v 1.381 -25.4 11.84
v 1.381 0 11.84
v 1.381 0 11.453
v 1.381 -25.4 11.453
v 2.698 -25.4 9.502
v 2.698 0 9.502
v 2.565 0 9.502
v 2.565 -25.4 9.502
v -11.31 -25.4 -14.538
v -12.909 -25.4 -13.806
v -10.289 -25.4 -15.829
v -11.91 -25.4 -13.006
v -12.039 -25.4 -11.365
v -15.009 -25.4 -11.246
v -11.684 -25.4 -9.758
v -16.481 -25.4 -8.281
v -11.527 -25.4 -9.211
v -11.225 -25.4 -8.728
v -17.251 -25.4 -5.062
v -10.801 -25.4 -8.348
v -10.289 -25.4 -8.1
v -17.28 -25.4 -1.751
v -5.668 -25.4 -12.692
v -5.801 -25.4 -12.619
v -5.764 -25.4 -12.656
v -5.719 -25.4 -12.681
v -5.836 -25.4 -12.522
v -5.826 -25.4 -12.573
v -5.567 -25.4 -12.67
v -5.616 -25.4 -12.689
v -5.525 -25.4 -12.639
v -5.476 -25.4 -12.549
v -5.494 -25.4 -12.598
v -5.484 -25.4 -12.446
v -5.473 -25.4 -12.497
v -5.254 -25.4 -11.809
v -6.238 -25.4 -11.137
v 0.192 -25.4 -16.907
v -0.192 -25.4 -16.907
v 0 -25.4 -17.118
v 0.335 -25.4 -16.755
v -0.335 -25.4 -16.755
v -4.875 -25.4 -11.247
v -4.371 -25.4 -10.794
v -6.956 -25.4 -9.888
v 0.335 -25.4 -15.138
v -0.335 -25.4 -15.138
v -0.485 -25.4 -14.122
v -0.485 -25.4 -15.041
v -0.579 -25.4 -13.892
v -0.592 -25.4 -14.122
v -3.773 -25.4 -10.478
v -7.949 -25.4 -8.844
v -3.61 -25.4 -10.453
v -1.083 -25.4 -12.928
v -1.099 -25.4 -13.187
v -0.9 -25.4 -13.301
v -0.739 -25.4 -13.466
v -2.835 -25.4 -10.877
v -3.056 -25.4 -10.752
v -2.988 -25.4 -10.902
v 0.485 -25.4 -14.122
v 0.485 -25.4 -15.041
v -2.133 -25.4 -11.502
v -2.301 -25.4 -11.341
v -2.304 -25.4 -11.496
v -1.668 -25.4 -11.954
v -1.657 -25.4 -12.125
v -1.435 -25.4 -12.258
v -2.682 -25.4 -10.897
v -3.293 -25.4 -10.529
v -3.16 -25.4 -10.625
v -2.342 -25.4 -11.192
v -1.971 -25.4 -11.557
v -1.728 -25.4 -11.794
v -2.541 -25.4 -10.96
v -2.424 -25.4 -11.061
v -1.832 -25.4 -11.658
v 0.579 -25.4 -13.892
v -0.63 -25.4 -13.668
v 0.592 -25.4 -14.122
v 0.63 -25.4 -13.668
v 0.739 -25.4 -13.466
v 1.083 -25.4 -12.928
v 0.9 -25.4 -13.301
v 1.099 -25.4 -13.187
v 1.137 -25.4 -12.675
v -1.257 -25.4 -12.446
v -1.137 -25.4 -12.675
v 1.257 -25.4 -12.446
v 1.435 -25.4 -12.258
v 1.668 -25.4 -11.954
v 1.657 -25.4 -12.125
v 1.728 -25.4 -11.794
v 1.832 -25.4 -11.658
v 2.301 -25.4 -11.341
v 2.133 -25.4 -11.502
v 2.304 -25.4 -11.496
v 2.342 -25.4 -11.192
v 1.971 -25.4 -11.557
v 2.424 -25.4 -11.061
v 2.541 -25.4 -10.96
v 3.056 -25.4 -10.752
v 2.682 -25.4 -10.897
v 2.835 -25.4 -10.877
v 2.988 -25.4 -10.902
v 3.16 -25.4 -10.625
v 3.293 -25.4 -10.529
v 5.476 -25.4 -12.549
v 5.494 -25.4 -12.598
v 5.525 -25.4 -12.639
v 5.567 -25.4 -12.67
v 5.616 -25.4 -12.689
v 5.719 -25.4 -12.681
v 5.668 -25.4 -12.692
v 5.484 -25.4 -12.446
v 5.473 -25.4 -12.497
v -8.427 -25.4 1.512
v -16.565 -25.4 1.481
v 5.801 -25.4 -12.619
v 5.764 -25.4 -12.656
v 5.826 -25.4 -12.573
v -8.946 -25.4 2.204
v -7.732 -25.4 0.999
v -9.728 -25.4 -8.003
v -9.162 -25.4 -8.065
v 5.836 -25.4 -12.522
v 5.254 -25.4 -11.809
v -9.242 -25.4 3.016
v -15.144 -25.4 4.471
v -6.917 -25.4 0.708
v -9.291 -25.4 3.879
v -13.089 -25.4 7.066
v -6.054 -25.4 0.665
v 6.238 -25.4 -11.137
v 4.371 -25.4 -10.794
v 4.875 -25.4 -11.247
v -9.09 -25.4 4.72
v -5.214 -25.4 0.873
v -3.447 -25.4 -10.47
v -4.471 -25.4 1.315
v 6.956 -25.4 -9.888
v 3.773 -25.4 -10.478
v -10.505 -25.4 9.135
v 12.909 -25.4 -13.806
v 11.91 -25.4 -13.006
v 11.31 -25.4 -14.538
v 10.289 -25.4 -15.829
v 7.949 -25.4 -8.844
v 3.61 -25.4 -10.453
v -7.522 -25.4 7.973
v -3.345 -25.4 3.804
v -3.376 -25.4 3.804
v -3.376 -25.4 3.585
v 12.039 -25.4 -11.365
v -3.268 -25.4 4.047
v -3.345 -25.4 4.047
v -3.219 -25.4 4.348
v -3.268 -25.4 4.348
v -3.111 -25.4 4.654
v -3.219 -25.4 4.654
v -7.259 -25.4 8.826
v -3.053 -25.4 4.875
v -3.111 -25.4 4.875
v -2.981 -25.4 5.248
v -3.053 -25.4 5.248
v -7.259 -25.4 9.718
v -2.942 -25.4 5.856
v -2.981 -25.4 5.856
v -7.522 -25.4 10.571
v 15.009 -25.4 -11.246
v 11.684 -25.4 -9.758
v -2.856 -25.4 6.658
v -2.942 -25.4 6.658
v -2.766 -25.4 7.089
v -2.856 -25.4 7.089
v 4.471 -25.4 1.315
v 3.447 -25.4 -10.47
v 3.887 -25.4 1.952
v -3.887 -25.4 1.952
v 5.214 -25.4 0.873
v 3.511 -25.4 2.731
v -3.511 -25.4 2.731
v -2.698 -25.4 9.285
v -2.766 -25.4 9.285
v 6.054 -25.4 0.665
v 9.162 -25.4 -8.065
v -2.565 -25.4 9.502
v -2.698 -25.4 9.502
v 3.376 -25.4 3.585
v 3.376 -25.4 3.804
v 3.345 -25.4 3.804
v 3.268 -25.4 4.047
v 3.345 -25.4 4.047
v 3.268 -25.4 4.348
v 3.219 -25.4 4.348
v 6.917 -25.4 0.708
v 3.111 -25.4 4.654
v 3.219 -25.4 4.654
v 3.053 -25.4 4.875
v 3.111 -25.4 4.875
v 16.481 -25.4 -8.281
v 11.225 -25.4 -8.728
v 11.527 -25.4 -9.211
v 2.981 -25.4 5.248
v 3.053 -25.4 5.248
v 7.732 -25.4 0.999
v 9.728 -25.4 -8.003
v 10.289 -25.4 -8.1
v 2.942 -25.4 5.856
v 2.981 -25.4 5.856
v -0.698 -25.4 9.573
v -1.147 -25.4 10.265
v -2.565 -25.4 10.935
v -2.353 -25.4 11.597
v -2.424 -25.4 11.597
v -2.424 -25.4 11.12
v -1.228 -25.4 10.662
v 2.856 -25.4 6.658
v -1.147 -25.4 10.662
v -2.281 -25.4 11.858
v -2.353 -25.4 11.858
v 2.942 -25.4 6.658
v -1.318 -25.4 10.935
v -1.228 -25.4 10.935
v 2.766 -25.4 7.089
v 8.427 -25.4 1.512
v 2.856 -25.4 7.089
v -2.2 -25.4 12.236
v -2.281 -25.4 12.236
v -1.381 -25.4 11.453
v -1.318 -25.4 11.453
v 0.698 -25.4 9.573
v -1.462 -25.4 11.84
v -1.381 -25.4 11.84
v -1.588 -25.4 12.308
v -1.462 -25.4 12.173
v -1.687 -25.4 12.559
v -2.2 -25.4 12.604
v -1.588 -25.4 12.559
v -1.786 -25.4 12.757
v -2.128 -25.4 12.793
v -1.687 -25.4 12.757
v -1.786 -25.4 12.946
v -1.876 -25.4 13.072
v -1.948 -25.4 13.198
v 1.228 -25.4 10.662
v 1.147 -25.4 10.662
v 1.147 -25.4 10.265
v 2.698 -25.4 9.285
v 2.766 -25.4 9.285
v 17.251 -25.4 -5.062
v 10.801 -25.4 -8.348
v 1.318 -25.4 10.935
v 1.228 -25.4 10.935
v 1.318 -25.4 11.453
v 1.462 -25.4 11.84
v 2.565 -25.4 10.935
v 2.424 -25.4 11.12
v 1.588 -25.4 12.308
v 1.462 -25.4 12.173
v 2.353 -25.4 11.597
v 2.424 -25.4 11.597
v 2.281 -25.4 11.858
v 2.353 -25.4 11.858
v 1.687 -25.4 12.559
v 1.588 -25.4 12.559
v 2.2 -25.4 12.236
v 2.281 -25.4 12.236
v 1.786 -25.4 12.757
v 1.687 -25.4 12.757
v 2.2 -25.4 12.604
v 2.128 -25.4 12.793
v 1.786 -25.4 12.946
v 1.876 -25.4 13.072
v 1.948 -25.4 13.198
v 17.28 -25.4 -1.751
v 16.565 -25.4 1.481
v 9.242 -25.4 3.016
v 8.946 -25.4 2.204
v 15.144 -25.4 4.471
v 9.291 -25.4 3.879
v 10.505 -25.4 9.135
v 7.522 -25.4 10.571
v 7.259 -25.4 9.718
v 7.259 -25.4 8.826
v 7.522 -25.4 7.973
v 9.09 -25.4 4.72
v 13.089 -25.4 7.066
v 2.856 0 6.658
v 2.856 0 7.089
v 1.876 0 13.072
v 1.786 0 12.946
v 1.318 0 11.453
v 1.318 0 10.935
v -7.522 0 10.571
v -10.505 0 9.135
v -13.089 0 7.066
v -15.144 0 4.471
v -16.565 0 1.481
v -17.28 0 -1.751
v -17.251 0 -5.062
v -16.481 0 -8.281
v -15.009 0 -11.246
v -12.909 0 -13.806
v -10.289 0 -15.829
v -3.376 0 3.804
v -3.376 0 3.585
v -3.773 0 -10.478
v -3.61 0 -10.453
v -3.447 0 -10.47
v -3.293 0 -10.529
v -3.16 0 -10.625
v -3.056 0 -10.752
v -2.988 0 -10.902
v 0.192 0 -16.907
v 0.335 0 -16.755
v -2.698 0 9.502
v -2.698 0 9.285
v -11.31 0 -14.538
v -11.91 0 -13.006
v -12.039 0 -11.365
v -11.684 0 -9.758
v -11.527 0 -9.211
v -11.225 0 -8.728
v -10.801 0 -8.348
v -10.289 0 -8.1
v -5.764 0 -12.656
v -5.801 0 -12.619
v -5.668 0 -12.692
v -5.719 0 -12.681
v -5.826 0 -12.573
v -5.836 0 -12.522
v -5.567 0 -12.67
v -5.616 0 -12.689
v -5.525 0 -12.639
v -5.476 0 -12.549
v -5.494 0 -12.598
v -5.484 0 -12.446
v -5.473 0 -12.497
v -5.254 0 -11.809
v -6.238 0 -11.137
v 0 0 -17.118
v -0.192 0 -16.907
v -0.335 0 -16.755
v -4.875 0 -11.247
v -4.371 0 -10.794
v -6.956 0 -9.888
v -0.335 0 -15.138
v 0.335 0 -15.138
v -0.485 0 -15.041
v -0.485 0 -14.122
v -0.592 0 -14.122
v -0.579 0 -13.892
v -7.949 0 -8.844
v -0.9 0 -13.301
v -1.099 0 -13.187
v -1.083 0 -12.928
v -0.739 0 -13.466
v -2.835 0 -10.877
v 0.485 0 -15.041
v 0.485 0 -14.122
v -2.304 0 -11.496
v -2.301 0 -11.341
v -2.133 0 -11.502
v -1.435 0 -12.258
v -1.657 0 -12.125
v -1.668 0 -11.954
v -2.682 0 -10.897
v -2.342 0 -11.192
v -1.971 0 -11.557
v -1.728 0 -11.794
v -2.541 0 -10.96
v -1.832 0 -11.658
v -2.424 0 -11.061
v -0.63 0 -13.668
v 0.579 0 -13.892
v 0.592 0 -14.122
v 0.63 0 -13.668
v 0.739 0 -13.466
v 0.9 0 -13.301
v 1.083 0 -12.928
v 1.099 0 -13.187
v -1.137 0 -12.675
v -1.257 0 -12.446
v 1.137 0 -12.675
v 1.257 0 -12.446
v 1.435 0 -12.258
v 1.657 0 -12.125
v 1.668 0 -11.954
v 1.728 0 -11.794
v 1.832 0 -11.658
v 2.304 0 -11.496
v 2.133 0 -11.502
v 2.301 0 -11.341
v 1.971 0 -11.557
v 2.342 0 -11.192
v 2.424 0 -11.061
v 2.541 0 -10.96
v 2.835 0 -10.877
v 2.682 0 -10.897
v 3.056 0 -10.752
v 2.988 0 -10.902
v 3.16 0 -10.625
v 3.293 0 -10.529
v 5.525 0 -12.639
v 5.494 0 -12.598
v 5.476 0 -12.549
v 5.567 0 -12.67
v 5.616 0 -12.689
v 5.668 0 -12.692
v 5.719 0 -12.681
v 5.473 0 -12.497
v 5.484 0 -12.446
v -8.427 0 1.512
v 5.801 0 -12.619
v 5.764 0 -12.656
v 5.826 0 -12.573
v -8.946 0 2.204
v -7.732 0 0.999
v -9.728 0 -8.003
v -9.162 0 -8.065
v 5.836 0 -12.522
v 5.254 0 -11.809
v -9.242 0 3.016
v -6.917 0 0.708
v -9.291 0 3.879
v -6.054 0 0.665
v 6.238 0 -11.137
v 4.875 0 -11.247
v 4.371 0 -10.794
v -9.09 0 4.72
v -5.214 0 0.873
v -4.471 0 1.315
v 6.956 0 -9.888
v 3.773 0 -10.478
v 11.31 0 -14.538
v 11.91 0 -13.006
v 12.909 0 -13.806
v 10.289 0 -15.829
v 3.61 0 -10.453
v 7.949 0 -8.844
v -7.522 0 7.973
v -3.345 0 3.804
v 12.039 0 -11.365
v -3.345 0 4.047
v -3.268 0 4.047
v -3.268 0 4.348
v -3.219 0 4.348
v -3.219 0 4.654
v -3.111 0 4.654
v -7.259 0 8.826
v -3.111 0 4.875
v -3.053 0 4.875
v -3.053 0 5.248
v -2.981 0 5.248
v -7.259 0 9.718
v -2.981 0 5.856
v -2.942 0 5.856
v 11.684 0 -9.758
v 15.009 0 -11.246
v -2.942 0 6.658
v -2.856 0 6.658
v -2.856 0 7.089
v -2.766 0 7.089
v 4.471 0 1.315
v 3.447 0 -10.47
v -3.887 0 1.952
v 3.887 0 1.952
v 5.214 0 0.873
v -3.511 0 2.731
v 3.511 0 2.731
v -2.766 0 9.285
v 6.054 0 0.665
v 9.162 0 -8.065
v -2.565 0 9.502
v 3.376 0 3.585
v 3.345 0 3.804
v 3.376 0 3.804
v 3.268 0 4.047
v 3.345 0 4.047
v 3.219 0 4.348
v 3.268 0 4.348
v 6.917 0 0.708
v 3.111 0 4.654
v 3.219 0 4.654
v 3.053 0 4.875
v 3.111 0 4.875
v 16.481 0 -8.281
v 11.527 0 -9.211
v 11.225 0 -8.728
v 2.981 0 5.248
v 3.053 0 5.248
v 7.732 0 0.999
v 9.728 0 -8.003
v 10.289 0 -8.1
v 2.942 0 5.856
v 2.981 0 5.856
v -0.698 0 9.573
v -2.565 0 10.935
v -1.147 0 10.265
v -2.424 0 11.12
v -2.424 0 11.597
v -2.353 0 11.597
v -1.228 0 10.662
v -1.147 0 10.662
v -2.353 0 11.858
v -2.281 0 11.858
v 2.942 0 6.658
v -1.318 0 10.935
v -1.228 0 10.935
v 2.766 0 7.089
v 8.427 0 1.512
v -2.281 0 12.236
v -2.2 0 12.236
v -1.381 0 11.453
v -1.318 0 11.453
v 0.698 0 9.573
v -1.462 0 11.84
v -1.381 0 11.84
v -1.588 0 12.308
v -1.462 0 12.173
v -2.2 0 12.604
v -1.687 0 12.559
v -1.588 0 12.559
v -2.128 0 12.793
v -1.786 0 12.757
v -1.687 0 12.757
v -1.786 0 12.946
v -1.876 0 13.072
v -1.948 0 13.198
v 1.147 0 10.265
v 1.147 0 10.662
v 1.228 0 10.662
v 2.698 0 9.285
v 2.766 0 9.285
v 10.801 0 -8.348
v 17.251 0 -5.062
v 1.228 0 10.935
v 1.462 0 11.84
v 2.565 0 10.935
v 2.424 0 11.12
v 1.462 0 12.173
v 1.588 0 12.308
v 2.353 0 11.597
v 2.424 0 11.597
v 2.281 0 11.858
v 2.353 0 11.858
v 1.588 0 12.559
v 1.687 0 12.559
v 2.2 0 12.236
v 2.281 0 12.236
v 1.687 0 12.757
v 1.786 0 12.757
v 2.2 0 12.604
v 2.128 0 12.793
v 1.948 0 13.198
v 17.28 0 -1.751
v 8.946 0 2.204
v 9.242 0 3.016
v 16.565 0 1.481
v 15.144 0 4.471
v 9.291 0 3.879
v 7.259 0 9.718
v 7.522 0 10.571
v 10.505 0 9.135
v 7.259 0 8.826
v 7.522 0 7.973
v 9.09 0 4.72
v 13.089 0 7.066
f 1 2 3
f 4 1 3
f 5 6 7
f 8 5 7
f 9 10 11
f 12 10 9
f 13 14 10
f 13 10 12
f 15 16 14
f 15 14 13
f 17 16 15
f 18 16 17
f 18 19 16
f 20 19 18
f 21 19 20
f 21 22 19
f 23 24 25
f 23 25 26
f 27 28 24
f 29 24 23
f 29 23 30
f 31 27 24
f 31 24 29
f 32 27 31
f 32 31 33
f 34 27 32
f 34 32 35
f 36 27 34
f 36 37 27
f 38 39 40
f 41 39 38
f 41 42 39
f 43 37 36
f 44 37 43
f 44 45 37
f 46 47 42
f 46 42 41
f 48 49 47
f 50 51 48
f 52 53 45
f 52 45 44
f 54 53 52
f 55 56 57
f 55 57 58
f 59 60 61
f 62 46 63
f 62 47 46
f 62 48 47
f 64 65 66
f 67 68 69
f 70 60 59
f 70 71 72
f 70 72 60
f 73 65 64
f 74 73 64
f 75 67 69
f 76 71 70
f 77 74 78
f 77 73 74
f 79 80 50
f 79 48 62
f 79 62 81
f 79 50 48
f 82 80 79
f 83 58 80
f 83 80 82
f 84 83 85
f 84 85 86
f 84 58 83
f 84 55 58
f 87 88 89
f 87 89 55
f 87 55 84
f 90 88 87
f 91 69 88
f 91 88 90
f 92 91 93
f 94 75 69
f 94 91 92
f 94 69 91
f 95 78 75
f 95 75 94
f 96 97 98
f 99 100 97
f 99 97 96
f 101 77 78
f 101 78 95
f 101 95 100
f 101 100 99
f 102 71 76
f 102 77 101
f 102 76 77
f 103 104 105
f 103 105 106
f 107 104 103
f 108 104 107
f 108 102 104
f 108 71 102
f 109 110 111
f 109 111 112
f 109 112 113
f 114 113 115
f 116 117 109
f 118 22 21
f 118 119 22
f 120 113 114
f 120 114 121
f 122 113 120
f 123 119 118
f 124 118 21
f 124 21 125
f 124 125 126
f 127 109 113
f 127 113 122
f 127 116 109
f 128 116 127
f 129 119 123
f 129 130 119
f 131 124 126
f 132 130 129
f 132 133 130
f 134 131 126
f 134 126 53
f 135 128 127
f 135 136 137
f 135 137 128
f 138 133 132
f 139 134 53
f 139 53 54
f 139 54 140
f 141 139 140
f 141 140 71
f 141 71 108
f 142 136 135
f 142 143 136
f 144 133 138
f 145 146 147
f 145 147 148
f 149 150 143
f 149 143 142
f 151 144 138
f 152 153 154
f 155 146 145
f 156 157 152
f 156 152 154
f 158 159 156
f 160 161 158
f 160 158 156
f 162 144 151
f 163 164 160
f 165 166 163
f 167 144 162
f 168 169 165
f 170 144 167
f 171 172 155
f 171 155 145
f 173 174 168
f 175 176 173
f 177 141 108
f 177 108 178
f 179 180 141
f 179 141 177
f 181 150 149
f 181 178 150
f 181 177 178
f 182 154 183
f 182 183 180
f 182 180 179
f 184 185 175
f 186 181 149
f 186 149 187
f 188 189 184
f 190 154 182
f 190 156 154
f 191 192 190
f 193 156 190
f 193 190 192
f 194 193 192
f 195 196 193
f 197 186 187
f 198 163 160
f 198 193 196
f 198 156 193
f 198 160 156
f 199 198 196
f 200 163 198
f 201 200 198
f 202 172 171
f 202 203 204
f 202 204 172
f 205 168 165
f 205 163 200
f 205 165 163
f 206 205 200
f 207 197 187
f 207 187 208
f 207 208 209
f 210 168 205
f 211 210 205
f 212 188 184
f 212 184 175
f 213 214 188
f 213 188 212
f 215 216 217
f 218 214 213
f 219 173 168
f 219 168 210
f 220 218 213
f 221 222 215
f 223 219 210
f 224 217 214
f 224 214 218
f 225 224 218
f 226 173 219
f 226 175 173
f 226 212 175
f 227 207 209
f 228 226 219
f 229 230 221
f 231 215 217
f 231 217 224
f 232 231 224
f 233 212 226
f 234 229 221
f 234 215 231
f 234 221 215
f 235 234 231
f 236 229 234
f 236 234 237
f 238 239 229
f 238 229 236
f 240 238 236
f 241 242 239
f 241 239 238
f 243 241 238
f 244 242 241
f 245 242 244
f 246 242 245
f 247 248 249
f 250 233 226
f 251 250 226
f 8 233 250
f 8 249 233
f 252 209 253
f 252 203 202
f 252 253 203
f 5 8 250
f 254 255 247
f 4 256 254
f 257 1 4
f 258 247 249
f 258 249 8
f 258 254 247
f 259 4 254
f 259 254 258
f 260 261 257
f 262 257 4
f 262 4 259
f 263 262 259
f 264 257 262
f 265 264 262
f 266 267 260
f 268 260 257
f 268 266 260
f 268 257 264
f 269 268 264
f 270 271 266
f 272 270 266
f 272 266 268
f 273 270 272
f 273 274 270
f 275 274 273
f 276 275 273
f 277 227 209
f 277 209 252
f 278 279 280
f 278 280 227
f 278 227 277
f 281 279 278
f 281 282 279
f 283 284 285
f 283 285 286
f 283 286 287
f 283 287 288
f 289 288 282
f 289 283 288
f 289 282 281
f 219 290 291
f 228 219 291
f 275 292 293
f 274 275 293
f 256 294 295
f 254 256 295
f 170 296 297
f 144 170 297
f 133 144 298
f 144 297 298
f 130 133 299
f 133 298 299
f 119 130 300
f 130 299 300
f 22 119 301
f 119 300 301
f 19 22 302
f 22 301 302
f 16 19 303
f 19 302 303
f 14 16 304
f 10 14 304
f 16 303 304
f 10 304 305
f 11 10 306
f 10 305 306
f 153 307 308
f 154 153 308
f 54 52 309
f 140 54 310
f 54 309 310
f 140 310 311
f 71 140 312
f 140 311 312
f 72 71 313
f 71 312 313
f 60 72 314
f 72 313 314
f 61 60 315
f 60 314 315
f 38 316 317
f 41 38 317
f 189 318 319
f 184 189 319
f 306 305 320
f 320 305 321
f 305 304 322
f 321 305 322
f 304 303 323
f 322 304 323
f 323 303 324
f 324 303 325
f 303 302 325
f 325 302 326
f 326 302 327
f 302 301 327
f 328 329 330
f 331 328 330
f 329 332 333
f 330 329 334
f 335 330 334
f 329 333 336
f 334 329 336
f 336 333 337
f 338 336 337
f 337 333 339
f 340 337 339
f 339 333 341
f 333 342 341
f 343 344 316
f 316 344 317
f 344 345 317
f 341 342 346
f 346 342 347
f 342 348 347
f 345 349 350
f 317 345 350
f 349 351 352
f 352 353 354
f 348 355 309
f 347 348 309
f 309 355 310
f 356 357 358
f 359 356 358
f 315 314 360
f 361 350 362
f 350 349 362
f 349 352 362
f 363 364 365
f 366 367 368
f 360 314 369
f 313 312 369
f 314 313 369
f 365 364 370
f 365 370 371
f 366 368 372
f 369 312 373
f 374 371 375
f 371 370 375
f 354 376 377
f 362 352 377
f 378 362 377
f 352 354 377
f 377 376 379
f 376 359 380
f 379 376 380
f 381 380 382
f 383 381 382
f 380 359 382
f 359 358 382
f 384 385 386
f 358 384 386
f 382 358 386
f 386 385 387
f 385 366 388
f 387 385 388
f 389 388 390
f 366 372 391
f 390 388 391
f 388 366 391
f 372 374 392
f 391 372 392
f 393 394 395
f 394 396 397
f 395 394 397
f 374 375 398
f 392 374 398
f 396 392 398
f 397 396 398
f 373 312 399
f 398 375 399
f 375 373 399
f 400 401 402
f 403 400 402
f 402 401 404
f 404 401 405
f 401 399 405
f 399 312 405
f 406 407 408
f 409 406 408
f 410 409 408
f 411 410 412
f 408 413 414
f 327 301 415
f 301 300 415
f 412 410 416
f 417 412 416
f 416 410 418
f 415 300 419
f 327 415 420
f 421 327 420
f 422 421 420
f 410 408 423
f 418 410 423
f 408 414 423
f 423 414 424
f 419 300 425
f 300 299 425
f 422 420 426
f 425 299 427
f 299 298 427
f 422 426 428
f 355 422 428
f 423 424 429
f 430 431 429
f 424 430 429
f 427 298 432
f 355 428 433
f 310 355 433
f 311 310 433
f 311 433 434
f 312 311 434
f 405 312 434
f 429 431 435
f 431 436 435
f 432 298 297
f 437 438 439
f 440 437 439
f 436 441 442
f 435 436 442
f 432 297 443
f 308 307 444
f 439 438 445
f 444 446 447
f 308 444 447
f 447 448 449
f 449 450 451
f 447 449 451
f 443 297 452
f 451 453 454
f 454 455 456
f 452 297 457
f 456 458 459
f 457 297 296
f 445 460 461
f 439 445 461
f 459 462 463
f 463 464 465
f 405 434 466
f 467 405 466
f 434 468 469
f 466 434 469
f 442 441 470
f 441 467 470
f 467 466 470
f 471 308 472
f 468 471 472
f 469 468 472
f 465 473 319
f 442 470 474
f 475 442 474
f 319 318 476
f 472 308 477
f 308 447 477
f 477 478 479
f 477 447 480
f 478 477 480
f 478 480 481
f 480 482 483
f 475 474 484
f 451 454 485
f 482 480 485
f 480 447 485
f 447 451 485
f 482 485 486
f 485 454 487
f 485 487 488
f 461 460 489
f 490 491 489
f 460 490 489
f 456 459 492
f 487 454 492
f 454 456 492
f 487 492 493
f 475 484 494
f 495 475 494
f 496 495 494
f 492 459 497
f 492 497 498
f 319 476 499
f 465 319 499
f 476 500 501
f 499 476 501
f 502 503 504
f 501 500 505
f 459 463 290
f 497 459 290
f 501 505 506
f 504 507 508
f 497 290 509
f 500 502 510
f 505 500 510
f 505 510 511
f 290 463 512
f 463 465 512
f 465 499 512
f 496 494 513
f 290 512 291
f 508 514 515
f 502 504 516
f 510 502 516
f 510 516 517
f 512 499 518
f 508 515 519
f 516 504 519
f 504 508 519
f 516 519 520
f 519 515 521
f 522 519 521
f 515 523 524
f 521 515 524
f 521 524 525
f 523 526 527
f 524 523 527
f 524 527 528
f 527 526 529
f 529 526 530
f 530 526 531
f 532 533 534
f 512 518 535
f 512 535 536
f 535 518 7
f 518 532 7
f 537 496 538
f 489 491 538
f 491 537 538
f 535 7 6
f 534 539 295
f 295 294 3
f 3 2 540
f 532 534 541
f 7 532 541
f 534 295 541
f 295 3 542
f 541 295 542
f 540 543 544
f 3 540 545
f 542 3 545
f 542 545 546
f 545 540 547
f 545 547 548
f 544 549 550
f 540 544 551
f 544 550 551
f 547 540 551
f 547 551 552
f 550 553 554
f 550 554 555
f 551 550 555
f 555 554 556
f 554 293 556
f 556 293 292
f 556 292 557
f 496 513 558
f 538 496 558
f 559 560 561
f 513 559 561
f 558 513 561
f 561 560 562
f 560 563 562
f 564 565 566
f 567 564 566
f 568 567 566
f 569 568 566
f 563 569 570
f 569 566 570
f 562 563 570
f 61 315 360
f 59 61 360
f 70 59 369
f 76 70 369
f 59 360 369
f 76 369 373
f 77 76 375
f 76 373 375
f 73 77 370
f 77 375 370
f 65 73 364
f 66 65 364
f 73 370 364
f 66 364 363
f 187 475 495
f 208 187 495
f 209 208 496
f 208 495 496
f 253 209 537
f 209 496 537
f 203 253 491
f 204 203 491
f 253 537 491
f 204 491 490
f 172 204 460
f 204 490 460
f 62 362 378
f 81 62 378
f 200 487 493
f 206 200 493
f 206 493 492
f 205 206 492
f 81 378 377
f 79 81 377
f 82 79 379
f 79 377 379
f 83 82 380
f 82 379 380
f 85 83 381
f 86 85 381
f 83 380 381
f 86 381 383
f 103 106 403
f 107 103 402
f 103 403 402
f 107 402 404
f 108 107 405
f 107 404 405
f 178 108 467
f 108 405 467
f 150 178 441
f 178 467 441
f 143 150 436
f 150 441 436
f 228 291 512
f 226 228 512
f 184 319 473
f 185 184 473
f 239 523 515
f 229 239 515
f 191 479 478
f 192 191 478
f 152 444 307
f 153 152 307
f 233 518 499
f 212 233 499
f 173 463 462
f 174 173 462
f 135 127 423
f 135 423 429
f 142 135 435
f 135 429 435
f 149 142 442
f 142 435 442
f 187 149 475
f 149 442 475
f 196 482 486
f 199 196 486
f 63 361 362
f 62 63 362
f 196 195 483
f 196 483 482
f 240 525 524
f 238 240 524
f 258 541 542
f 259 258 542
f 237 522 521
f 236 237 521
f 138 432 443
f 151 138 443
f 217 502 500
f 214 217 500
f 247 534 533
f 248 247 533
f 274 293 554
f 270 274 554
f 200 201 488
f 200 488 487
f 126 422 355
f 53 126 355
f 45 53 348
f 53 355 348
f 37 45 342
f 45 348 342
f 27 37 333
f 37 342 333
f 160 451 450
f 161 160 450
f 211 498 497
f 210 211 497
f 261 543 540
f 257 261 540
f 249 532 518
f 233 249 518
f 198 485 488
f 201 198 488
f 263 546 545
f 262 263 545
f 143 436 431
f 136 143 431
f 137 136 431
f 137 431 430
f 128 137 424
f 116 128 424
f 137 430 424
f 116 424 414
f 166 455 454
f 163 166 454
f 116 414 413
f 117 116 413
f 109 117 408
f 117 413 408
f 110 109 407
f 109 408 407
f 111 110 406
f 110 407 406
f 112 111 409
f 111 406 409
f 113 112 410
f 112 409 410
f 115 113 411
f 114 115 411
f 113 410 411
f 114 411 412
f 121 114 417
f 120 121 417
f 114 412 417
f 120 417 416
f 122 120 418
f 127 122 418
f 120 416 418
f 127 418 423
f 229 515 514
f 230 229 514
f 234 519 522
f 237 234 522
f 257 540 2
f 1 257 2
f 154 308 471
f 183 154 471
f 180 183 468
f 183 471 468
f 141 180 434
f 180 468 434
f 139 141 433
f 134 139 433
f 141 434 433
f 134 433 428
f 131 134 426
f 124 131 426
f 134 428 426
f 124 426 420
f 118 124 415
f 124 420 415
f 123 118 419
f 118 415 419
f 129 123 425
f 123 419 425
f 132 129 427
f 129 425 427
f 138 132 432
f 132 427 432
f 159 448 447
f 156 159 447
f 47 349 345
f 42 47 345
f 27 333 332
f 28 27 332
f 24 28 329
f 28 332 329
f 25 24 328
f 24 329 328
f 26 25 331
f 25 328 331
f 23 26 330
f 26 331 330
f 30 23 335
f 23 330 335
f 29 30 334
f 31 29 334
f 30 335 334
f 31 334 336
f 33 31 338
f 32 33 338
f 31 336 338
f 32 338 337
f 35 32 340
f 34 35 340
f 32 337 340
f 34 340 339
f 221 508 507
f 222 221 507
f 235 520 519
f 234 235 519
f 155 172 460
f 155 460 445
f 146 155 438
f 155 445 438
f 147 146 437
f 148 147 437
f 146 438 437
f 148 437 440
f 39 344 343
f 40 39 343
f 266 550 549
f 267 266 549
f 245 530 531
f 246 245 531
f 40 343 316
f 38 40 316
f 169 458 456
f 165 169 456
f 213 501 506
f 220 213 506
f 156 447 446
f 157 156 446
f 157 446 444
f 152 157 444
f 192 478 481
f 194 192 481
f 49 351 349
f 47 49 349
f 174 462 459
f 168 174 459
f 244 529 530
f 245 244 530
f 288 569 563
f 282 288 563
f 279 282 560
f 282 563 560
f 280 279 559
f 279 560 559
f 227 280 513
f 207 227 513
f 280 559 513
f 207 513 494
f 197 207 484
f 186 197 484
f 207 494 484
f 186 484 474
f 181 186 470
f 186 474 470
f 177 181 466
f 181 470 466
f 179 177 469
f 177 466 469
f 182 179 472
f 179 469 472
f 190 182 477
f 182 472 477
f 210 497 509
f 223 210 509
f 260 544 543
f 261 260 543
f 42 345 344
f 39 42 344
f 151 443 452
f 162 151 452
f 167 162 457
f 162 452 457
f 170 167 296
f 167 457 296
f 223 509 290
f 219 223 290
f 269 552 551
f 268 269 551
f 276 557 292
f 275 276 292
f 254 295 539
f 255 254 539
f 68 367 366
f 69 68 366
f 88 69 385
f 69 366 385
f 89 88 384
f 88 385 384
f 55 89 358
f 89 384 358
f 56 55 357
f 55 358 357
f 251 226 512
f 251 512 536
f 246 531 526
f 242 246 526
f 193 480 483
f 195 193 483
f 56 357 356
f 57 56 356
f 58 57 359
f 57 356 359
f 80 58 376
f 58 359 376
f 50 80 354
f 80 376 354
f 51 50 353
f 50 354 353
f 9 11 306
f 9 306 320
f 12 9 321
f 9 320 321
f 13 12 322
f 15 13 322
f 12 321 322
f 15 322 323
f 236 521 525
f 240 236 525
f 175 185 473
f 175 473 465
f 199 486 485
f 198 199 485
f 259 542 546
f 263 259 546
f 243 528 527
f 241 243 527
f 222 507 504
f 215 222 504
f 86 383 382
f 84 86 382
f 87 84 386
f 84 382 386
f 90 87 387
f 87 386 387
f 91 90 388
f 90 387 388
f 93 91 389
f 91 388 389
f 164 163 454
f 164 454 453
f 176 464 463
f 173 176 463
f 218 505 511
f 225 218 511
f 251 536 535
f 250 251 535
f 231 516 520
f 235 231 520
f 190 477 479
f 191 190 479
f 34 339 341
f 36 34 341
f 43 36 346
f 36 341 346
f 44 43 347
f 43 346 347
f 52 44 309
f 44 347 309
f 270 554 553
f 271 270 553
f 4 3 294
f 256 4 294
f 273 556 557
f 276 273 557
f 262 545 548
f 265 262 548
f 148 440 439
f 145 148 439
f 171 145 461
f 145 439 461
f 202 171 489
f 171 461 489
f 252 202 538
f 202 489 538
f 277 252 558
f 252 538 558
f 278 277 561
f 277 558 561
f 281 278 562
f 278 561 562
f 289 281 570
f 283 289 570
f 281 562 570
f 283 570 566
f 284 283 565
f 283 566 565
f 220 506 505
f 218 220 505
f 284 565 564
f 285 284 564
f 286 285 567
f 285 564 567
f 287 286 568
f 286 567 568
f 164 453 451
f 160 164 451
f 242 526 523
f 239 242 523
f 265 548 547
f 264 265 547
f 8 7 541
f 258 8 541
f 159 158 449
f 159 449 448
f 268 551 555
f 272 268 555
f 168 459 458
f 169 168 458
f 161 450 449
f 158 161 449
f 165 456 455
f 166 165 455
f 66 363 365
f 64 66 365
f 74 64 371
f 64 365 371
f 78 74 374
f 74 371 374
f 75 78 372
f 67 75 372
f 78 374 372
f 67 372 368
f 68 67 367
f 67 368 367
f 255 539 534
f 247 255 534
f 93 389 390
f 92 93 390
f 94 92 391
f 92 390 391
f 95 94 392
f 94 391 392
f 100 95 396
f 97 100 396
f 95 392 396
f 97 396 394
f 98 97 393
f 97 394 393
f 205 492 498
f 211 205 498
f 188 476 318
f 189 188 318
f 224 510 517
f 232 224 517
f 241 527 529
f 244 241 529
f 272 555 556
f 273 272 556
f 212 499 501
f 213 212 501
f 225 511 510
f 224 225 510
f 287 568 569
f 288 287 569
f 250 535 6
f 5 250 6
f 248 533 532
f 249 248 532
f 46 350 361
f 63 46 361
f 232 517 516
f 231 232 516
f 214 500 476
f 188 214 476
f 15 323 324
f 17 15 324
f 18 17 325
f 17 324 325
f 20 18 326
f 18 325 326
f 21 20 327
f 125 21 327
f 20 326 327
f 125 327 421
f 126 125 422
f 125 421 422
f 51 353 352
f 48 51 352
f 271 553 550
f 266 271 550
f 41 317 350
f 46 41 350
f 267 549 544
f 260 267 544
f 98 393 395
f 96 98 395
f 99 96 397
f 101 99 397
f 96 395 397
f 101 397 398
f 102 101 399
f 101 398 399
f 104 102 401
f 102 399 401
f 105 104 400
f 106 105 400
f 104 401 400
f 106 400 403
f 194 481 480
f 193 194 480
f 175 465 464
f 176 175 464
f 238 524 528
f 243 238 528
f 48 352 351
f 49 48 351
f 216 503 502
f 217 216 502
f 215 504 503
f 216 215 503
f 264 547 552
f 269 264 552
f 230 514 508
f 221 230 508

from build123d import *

# Parameters (mm, degrees)
F1_DEPTH = 25.4


with BuildPart() as f1:
    # F0 (on Front) → F1 (new body)
    with BuildSketch(Plane.XZ):
        with BuildLine():
            ThreePointArc((11.683757, -9.757952), (11.910295, -13.005869), (10.289053, -15.829317))
            ThreePointArc((10.289053, -15.829317), (17.279713, -1.751364), (7.521968, 10.571157))
            ThreePointArc((7.521968, 10.571157), (7.225303, 9.272076), (7.521968, 7.972996))
            Line((7.521968, 7.972996), (9.089584, 4.719736))
            ThreePointArc((9.089584, 4.719736), (6.917131, 0.708181), (3.376378, 3.584845))
            Line((3.376378, 3.584845), (3.376378, 3.804322))
            Line((3.376378, 3.804322), (3.344805, 3.804322))
            Line((3.344805, 3.804322), (3.344805, 4.047158))
            Line((3.344805, 4.047158), (3.268356, 4.047158))
            Line((3.268356, 4.047158), (3.268356, 4.348455))
            Line((3.268356, 4.348455), (3.218889, 4.348455))
            Line((3.218889, 4.348455), (3.218889, 4.654248))
            Line((3.218889, 4.654248), (3.110962, 4.654248))
            Line((3.110962, 4.654248), (3.110962, 4.8746))
            Line((3.110962, 4.8746), (3.052502, 4.8746))
            Line((3.052502, 4.8746), (3.052502, 5.247848))
            Line((3.052502, 5.247848), (2.98055, 5.247848))
            Line((2.98055, 5.247848), (2.98055, 5.855694))
            Line((2.98055, 5.855694), (2.941553, 5.855694))
            Line((2.941553, 5.855694), (2.941553, 6.657867))
            Line((2.941553, 6.657867), (2.855988, 6.657867))
            Line((2.855988, 6.657867), (2.855988, 7.089451))
            Line((2.855988, 7.089451), (2.765684, 7.089451))
            Line((2.765684, 7.089451), (2.765684, 7.641547))
            Line((2.765684, 7.641547), (2.765684, 9.285447))
            Line((2.765684, 9.285447), (2.69841, 9.285447))
            Line((2.69841, 9.285447), (2.69841, 9.501676))
            Line((2.69841, 9.501676), (2.564857, 9.501676))
            Line((2.564857, 9.501676), (2.564857, 10.264836))
            Line((2.564857, 10.264836), (2.564857, 10.934666))
            Line((2.564857, 10.934666), (2.42448, 11.120381))
            Line((2.42448, 11.120381), (2.42448, 11.597059))
            Line((2.42448, 11.597059), (2.352529, 11.597059))
            Line((2.352529, 11.597059), (2.352529, 11.857883))
            Line((2.352529, 11.857883), (2.280578, 11.857883))
            Line((2.280578, 11.857883), (2.280578, 12.235628))
            Line((2.280578, 12.235628), (2.199632, 12.235628))
            Line((2.199632, 12.235628), (2.199632, 12.451482))
            Line((2.199632, 12.451482), (2.199632, 12.604379))
            Line((2.199632, 12.604379), (2.12768, 12.793251))
            Line((2.12768, 12.793251), (1.947802, 13.197979))
            Line((1.947802, 13.197979), (1.875851, 13.072063))
            Line((1.875851, 13.072063), (1.785911, 12.946148))
            Line((1.785911, 12.946148), (1.785911, 12.757276))
            Line((1.785911, 12.757276), (1.686978, 12.757276))
            Line((1.686978, 12.757276), (1.686978, 12.559409))
            Line((1.686978, 12.559409), (1.588045, 12.559409))
            Line((1.588045, 12.559409), (1.588045, 12.30758))
            Line((1.588045, 12.30758), (1.46213, 12.17267))
            Line((1.46213, 12.17267), (1.46213, 11.839896))
            Line((1.46213, 11.839896), (1.381184, 11.839896))
            Line((1.381184, 11.839896), (1.381184, 11.453156))
            Line((1.381184, 11.453156), (1.318227, 11.453156))
            Line((1.318227, 11.453156), (1.318227, 10.934666))
            Line((1.318227, 10.934666), (1.228288, 10.934666))
            Line((1.228288, 10.934666), (1.228288, 10.66169))
            Line((1.228288, 10.66169), (1.147342, 10.66169))
            Line((1.147342, 10.66169), (1.147342, 10.264836))
            Line((1.147342, 10.264836), (0.697646, 9.573425))
            Line((0.697646, 9.573425), (0, 9.573425))
            Line((0, 9.573425), (-0.697646, 9.573425))
            Line((-0.697646, 9.573425), (-1.147342, 10.264836))
            Line((-1.147342, 10.264836), (-1.147342, 10.66169))
            Line((-1.147342, 10.66169), (-1.228288, 10.66169))
            Line((-1.228288, 10.66169), (-1.228288, 10.934666))
            Line((-1.228288, 10.934666), (-1.318227, 10.934666))
            Line((-1.318227, 10.934666), (-1.318227, 11.453156))
            Line((-1.318227, 11.453156), (-1.381184, 11.453156))
            Line((-1.381184, 11.453156), (-1.381184, 11.839896))
            Line((-1.381184, 11.839896), (-1.46213, 11.839896))
            Line((-1.46213, 11.839896), (-1.46213, 12.17267))
            Line((-1.46213, 12.17267), (-1.588045, 12.30758))
            Line((-1.588045, 12.30758), (-1.588045, 12.559409))
            Line((-1.588045, 12.559409), (-1.686978, 12.559409))
            Line((-1.686978, 12.559409), (-1.686978, 12.757276))
            Line((-1.686978, 12.757276), (-1.785911, 12.757276))
            Line((-1.785911, 12.757276), (-1.785911, 12.946148))
            Line((-1.785911, 12.946148), (-1.875851, 13.072063))
            Line((-1.875851, 13.072063), (-1.947802, 13.197979))
            Line((-1.947802, 13.197979), (-2.12768, 12.793251))
            Line((-2.12768, 12.793251), (-2.199632, 12.604379))
            Line((-2.199632, 12.604379), (-2.199632, 12.451482))
            Line((-2.199632, 12.451482), (-2.199632, 12.235628))
            Line((-2.199632, 12.235628), (-2.280578, 12.235628))
            Line((-2.280578, 12.235628), (-2.280578, 11.857883))
            Line((-2.280578, 11.857883), (-2.352529, 11.857883))
            Line((-2.352529, 11.857883), (-2.352529, 11.597059))
            Line((-2.352529, 11.597059), (-2.42448, 11.597059))
            Line((-2.42448, 11.597059), (-2.42448, 11.120381))
            Line((-2.42448, 11.120381), (-2.564857, 10.934666))
            Line((-2.564857, 10.934666), (-2.564857, 10.264836))
            Line((-2.564857, 10.264836), (-2.564857, 9.501676))
            Line((-2.564857, 9.501676), (-2.69841, 9.501676))
            Line((-2.69841, 9.501676), (-2.69841, 9.285447))
            Line((-2.69841, 9.285447), (-2.765684, 9.285447))
            Line((-2.765684, 9.285447), (-2.765684, 7.641547))
            Line((-2.765684, 7.641547), (-2.765684, 7.089451))
            Line((-2.765684, 7.089451), (-2.855988, 7.089451))
            Line((-2.855988, 7.089451), (-2.855988, 6.657867))
            Line((-2.855988, 6.657867), (-2.941553, 6.657867))
            Line((-2.941553, 6.657867), (-2.941553, 5.855694))
            Line((-2.941553, 5.855694), (-2.98055, 5.855694))
            Line((-2.98055, 5.855694), (-2.98055, 5.247848))
            Line((-2.98055, 5.247848), (-3.052502, 5.247848))
            Line((-3.052502, 5.247848), (-3.052502, 4.8746))
            Line((-3.052502, 4.8746), (-3.110962, 4.8746))
            Line((-3.110962, 4.8746), (-3.110962, 4.654248))
            Line((-3.110962, 4.654248), (-3.218889, 4.654248))
            Line((-3.218889, 4.654248), (-3.218889, 4.348455))
            Line((-3.218889, 4.348455), (-3.268356, 4.348455))
            Line((-3.268356, 4.348455), (-3.268356, 4.047158))
            Line((-3.268356, 4.047158), (-3.344805, 4.047158))
            Line((-3.344805, 4.047158), (-3.344805, 3.804322))
            Line((-3.344805, 3.804322), (-3.376378, 3.804322))
            Line((-3.376378, 3.804322), (-3.376378, 3.584845))
            ThreePointArc((-3.376378, 3.584845), (-6.917131, 0.708181), (-9.089584, 4.719736))
            Line((-9.089584, 4.719736), (-7.521968, 7.972996))
            ThreePointArc((-7.521968, 7.972996), (-7.225303, 9.272076), (-7.521968, 10.571157))
            ThreePointArc((-7.521968, 10.571157), (-17.279713, -1.751364), (-10.289053, -15.829317))
            ThreePointArc((-10.289053, -15.829317), (-11.910295, -13.005869), (-11.683757, -9.757952))
            ThreePointArc((-11.683757, -9.757952), (-10.801152, -8.348372), (-9.162284, -8.065494))
            ThreePointArc((-9.162284, -8.065494), (-6.955625, -9.887781), (-5.836201, -12.521592))
            ThreePointArc((-5.836201, -12.521592), (-5.616042, -12.688557), (-5.483937, -12.445873))
            ThreePointArc((-5.483937, -12.445873), (-4.875184, -11.247178), (-3.772633, -10.477873))
            ThreePointArc((-3.772633, -10.477873), (-3.293187, -10.529047), (-2.987732, -10.902121))
            ThreePointArc((-2.987732, -10.902121), (-2.478858, -11.006497), (-2.304193, -11.49572))
            ThreePointArc((-2.304193, -11.49572), (-1.83181, -11.65766), (-1.65663, -12.125296))
            ThreePointArc((-1.65663, -12.125296), (-1.189071, -12.556765), (-1.099007, -13.186579))
            ThreePointArc((-1.099007, -13.186579), (-0.677638, -13.56305), (-0.591807, -14.121543))
            Line((-0.591807, -14.121543), (-0.484851, -14.121543))
            Line((-0.484851, -14.121543), (-0.484851, -15.041369))
            Line((-0.484851, -15.041369), (-0.335112, -15.13763))
            Line((-0.335112, -15.13763), (-0.335112, -16.196499))
            Line((-0.335112, -16.196499), (-0.335112, -16.755452))
            Line((-0.335112, -16.755452), (-0.192083, -16.906712))
            Line((-0.192083, -16.906712), (0, -17.118476))
            Line((0, -17.118476), (0.192083, -16.906712))
            Line((0.192083, -16.906712), (0.335112, -16.755452))
            Line((0.335112, -16.755452), (0.335112, -16.196499))
            Line((0.335112, -16.196499), (0.335112, -15.13763))
            Line((0.335112, -15.13763), (0.484851, -15.041369))
            Line((0.484851, -15.041369), (0.484851, -14.121543))
            Line((0.484851, -14.121543), (0.591807, -14.121543))
            ThreePointArc((0.591807, -14.121543), (0.677638, -13.56305), (1.099007, -13.186579))
            ThreePointArc((1.099007, -13.186579), (1.189071, -12.556765), (1.65663, -12.125296))
            ThreePointArc((1.65663, -12.125296), (1.83181, -11.65766), (2.304193, -11.49572))
            ThreePointArc((2.304193, -11.49572), (2.478858, -11.006497), (2.987732, -10.902121))
            ThreePointArc((2.987732, -10.902121), (3.293187, -10.529047), (3.772633, -10.477873))
            ThreePointArc((3.772633, -10.477873), (4.875184, -11.247178), (5.483937, -12.445873))
            ThreePointArc((5.483937, -12.445873), (5.616042, -12.688557), (5.836201, -12.521592))
            ThreePointArc((5.836201, -12.521592), (6.955625, -9.887781), (9.162284, -8.065494))
            ThreePointArc((9.162284, -8.065494), (10.801152, -8.348372), (11.683757, -9.757952))
        make_face()
    extrude(amount=F1_DEPTH)


solid = f1.part
